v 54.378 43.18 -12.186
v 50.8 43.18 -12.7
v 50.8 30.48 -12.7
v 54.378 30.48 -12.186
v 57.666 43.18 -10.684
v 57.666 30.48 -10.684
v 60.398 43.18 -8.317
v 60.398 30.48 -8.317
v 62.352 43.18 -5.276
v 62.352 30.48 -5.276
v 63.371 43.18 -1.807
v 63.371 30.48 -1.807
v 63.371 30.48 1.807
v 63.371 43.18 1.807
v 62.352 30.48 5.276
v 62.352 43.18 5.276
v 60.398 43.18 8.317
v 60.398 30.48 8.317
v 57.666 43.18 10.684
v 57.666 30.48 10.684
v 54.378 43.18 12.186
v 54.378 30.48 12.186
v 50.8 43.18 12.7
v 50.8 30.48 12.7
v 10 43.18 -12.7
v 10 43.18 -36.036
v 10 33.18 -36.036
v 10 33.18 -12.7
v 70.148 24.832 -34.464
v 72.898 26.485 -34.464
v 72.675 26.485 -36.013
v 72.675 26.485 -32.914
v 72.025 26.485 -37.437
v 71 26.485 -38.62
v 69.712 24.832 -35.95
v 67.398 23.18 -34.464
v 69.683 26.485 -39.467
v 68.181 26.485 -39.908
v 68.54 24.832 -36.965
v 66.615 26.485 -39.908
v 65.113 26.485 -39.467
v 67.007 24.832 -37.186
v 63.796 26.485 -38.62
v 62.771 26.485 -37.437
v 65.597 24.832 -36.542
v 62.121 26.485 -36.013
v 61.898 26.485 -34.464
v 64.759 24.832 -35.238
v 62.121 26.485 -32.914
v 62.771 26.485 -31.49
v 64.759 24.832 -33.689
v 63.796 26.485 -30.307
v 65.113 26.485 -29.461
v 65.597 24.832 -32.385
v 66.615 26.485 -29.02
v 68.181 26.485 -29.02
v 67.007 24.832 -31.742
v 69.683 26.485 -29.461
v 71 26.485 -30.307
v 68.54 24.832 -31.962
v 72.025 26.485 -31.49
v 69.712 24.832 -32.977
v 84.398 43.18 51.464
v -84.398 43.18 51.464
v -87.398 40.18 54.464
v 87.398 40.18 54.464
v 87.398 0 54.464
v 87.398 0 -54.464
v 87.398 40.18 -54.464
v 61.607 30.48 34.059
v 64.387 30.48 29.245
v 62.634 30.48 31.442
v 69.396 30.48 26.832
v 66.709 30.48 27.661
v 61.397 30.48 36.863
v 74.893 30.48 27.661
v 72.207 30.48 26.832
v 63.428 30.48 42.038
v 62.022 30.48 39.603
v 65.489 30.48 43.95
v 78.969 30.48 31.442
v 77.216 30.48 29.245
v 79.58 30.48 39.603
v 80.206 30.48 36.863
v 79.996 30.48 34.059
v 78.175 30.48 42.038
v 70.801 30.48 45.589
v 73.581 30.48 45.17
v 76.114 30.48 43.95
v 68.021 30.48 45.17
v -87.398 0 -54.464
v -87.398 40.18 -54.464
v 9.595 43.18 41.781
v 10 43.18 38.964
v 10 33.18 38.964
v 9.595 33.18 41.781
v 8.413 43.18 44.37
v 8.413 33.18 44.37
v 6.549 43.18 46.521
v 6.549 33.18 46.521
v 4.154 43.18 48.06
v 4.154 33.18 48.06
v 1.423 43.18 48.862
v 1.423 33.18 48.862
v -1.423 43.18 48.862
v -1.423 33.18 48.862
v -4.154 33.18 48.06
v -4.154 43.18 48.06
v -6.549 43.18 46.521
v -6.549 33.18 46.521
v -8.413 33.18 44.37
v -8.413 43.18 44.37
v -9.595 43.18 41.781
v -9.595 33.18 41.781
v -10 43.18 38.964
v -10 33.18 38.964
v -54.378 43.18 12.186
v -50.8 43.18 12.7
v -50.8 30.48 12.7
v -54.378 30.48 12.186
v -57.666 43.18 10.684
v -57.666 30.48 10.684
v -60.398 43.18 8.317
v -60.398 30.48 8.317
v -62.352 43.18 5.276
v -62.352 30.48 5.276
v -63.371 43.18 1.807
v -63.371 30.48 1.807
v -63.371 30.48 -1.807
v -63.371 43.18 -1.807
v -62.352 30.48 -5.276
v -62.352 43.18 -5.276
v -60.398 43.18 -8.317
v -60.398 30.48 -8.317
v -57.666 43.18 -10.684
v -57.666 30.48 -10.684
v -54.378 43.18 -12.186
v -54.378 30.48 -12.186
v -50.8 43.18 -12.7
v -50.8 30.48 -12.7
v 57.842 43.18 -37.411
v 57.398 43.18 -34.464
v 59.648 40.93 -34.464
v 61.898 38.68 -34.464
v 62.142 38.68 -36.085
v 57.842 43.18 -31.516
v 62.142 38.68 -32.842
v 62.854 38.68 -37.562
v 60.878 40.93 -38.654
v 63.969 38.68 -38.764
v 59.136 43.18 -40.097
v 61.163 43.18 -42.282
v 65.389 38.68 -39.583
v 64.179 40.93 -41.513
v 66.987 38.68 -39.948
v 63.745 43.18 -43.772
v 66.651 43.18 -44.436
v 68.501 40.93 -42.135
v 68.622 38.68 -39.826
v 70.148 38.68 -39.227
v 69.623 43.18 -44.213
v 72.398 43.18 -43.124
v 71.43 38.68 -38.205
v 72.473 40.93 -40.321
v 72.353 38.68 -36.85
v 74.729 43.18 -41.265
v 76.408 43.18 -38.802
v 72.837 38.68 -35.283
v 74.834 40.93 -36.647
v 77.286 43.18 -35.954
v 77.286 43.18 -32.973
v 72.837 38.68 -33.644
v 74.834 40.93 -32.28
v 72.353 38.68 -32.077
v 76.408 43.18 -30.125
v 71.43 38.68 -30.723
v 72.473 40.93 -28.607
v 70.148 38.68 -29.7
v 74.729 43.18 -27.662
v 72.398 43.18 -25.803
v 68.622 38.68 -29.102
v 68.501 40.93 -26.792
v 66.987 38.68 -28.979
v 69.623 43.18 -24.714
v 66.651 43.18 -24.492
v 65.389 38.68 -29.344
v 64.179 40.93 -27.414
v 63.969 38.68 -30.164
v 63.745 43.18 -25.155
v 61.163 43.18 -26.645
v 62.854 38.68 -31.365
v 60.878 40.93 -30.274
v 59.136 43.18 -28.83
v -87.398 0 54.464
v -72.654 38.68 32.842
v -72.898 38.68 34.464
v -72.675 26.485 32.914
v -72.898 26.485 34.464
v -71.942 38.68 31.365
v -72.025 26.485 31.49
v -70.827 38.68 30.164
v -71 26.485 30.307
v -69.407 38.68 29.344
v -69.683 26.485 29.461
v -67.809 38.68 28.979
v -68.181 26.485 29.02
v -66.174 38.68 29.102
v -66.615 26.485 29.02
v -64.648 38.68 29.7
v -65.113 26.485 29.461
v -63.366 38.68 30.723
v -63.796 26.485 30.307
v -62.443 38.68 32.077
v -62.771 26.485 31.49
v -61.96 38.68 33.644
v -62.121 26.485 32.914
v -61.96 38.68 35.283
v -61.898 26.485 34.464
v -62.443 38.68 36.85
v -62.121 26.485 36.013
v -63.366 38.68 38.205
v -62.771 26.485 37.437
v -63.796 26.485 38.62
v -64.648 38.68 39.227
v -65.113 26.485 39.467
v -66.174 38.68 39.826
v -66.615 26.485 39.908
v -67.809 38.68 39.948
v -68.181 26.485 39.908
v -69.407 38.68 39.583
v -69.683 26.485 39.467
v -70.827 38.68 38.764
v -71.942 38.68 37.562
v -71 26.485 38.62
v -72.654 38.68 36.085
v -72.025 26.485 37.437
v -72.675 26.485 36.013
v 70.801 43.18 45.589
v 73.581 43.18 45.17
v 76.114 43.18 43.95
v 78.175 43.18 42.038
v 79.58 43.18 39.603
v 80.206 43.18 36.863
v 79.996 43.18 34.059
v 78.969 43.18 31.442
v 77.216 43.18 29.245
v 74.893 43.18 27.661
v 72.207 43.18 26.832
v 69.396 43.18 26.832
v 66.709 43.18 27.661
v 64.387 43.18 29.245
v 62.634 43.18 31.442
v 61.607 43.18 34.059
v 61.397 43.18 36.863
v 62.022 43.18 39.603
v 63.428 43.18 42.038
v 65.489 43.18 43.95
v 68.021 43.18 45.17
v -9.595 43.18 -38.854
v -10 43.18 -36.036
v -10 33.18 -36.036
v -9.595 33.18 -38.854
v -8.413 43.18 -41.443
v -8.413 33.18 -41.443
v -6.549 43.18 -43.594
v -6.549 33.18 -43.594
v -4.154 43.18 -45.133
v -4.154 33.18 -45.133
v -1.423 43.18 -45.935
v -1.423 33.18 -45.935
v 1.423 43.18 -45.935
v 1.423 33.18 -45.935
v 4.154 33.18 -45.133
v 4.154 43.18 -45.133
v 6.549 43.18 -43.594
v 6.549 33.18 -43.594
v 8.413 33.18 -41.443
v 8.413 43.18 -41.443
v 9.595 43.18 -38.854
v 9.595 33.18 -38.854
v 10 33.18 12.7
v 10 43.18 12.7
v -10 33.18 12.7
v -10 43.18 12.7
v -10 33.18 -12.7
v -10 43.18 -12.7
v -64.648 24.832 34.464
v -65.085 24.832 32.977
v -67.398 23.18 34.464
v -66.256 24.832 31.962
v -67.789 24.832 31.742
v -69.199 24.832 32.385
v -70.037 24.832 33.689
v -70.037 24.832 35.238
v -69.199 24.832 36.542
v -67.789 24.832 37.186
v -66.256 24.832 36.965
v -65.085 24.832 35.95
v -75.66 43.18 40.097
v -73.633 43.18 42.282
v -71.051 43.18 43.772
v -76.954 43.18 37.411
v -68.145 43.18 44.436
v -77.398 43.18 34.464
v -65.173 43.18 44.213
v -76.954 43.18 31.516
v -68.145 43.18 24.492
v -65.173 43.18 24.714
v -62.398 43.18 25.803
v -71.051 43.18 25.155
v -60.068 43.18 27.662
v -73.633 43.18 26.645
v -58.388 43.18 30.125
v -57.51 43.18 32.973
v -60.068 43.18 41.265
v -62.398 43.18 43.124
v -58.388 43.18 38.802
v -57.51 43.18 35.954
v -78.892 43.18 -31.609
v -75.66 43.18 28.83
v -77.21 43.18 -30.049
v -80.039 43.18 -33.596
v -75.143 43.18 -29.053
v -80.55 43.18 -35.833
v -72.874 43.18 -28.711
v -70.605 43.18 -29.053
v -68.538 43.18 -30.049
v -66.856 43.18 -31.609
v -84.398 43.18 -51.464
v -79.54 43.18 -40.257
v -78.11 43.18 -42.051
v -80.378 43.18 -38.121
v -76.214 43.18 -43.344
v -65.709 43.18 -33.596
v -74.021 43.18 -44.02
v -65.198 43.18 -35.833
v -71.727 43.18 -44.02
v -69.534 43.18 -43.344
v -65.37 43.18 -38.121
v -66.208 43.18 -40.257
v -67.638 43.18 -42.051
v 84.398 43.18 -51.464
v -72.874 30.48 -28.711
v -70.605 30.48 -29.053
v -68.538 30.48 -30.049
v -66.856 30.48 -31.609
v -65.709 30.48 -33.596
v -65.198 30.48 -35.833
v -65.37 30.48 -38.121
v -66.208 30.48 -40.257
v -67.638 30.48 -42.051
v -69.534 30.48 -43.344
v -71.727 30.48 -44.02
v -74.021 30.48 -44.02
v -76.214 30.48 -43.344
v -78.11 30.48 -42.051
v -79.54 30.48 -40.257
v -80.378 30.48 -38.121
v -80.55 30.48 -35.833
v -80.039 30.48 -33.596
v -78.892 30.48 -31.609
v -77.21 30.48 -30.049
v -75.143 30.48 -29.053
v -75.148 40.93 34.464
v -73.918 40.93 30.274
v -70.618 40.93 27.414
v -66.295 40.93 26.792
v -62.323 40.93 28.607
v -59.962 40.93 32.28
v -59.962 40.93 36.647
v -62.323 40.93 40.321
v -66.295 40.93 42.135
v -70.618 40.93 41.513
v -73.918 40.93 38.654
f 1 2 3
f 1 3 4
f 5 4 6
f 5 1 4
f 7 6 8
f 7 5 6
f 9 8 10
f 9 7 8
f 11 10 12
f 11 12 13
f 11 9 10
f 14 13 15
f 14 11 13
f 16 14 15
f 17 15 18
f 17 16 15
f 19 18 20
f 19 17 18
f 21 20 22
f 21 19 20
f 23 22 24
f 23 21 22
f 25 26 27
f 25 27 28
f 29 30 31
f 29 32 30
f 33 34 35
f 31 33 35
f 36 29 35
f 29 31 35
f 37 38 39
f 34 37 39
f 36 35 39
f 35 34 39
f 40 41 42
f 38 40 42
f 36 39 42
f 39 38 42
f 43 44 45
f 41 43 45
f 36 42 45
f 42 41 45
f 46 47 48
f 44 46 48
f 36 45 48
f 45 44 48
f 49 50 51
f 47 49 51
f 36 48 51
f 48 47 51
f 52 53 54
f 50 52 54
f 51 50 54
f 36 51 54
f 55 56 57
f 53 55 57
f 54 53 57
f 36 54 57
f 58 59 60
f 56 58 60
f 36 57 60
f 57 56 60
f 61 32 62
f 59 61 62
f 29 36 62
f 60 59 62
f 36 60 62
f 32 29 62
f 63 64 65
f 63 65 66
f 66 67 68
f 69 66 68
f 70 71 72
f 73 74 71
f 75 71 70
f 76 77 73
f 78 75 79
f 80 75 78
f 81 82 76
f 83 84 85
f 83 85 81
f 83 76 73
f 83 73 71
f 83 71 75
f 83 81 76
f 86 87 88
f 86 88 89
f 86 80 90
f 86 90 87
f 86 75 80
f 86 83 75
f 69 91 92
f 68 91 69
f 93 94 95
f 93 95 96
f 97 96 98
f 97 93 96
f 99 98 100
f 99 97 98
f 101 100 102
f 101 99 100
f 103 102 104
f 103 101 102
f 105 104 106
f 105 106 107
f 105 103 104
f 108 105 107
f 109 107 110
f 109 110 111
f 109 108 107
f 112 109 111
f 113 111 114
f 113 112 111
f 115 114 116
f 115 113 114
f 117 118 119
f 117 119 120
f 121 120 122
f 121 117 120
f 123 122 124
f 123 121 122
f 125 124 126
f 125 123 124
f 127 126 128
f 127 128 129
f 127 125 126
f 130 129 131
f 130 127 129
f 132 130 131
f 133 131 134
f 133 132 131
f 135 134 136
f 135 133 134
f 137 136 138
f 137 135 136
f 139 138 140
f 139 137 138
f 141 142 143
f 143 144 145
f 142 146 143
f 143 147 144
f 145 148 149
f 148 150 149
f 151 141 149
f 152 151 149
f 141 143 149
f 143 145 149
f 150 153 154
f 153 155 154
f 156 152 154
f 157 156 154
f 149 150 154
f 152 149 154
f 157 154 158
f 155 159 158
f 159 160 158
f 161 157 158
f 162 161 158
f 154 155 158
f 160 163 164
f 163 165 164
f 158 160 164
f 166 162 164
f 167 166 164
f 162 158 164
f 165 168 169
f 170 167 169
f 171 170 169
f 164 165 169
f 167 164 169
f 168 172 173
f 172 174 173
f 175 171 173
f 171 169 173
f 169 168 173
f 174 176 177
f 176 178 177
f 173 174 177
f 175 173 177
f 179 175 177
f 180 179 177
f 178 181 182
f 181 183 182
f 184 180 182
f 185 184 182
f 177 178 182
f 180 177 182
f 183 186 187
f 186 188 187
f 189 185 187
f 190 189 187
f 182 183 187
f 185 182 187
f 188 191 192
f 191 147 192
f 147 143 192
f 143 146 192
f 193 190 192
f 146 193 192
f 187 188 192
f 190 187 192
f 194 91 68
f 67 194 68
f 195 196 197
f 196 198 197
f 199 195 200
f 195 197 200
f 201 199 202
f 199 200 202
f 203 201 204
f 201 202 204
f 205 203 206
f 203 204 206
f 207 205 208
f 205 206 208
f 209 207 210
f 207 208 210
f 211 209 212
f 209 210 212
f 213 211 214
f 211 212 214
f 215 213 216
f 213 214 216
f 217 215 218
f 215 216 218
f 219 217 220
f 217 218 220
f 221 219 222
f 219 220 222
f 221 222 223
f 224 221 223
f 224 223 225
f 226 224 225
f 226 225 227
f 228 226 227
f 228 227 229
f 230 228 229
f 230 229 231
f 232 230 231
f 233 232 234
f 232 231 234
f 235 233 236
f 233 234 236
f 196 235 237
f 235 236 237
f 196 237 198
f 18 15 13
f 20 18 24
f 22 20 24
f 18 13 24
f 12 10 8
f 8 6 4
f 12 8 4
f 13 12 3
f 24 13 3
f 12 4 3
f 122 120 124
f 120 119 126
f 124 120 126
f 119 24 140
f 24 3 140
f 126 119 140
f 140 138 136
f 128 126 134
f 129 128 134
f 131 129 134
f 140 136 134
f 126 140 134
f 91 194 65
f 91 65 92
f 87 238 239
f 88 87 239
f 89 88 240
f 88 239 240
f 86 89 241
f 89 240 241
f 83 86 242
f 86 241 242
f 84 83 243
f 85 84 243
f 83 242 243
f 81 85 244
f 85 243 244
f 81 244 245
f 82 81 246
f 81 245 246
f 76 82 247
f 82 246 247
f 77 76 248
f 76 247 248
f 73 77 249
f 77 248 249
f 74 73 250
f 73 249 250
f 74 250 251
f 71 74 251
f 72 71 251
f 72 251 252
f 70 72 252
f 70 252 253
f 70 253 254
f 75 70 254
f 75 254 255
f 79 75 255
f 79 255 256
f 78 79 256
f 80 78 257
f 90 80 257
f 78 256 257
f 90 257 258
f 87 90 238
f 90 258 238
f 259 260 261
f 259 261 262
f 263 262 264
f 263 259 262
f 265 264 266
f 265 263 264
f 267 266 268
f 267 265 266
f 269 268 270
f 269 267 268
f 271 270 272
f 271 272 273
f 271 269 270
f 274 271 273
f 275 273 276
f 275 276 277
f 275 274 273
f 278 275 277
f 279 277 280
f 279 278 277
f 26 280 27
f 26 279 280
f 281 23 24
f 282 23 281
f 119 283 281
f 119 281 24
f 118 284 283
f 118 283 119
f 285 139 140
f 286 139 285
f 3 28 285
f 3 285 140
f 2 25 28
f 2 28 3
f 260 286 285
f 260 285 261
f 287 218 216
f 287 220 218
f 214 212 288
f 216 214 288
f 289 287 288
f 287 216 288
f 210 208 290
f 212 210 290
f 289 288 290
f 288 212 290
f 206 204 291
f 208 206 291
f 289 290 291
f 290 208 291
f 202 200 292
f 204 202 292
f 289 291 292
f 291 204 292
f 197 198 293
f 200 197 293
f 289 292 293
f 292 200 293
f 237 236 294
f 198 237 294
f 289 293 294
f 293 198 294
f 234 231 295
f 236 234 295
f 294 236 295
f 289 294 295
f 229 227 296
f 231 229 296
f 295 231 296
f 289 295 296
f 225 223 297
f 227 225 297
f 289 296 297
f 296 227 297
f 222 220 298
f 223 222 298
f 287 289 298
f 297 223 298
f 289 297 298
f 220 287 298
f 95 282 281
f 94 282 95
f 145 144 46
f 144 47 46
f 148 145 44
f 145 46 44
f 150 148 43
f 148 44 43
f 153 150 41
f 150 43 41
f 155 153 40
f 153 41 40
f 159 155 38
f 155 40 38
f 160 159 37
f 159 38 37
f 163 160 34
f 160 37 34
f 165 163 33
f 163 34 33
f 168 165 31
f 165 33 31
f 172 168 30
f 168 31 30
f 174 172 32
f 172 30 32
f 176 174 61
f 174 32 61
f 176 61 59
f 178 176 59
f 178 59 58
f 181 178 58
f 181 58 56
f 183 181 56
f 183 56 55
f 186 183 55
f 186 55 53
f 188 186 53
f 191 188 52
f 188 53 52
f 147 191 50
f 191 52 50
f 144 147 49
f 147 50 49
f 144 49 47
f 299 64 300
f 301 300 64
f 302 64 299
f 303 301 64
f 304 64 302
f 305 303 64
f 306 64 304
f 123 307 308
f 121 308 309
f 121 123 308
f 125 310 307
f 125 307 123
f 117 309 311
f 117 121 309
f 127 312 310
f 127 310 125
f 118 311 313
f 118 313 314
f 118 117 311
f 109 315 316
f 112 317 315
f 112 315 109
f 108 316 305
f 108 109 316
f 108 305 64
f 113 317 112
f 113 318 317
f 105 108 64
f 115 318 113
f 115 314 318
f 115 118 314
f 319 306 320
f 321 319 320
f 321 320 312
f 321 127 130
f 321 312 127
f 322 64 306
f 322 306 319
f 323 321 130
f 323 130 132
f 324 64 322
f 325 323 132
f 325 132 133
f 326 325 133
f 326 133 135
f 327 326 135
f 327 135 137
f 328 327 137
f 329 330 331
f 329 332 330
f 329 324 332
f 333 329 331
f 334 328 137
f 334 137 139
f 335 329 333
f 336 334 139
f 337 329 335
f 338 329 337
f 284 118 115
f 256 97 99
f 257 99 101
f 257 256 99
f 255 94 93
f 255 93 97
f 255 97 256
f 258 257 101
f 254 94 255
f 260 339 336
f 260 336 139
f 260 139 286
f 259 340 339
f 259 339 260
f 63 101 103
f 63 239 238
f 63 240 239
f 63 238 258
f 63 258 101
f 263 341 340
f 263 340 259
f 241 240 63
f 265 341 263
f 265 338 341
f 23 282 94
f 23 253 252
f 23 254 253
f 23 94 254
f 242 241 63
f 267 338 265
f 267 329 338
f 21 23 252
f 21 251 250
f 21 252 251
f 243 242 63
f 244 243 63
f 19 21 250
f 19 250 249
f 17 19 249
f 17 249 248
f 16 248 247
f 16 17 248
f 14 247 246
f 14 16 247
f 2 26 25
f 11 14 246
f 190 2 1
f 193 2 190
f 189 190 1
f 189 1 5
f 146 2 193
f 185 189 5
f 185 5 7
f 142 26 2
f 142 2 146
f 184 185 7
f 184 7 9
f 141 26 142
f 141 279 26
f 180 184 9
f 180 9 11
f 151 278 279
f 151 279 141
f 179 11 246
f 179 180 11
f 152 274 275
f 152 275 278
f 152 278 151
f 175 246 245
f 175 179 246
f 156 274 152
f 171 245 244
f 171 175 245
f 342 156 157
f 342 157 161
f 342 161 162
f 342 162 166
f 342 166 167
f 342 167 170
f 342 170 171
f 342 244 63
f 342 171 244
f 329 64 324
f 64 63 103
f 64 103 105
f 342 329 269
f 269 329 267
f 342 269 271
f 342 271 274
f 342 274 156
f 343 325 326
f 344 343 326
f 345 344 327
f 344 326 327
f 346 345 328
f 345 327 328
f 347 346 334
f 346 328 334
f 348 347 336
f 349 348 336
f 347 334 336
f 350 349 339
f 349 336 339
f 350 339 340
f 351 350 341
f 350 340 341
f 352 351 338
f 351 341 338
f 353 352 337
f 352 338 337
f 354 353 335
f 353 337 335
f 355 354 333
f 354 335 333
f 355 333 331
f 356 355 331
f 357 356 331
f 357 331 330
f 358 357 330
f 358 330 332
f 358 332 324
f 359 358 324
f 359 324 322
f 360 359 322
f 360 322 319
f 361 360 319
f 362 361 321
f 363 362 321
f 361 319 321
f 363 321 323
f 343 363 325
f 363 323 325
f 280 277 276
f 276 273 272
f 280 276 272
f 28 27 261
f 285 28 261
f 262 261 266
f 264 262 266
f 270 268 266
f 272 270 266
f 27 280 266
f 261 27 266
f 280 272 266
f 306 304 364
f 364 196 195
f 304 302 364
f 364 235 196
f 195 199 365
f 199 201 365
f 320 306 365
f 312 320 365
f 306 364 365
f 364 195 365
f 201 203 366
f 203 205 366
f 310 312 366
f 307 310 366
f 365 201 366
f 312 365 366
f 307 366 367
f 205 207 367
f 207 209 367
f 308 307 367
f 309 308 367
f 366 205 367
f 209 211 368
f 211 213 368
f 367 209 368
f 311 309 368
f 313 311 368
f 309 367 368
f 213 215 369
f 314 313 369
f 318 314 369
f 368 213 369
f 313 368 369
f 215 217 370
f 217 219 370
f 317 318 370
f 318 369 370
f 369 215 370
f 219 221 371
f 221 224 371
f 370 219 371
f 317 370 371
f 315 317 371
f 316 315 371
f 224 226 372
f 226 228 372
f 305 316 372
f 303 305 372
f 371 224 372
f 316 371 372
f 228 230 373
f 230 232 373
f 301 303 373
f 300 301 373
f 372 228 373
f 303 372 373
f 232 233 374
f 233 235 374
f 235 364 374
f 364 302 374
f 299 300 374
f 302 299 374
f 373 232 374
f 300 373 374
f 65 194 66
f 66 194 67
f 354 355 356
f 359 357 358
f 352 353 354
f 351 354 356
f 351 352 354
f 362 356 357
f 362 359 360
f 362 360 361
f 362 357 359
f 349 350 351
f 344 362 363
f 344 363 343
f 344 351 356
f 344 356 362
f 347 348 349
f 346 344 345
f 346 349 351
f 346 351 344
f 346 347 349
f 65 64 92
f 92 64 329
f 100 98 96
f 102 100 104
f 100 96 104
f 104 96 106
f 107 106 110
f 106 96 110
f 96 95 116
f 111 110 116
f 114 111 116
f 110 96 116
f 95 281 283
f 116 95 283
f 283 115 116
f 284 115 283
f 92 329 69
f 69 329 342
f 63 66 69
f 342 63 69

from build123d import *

# Parameters (mm, degrees)
SKETCH1_W                                        = 174.796166906
SKETCH1_H                                        = 108.92723011
BOSS_EXTRUDE1_DEPTH                              = 43.18
SKETCH2_R                                        = 7.697413188
SKETCH2_R_2                                      = 9.430807524
CUT_EXTRUDE1_DEPTH                               = 12.7
CUT_EXTRUDE2_DEPTH                               = 10
CSK_FOR_M10_FLAT_HEAD_MACHINE_SCREW1_D           = 11
CSK_FOR_M10_FLAT_HEAD_MACHINE_SCREW1_DEPTH       = 16.695266595
CSK_FOR_M10_FLAT_HEAD_MACHINE_SCREW1_CSINK_D     = 20
CSK_FOR_M10_FLAT_HEAD_MACHINE_SCREW1_CSINK_ANGLE = 90
CSK_FOR_M10_FLAT_HEAD_MACHINE_SCREW1_TIP         = 3.304733405
CHAMFER1_SIZE                                    = 3


with BuildPart() as part:
    # Sketch1 → Boss-Extrude1 (new body)
    with BuildSketch(Plane(origin=(0, 0, 0), x_dir=(1, 0, 0), z_dir=(0, 1, 0))):
        Rectangle(SKETCH1_W, SKETCH1_H)
    extrude(amount=BOSS_EXTRUDE1_DEPTH)

    # Sketch2 → Cut-Extrude1 (cut)
    with BuildSketch(Plane(origin=(0, 43.18, 0), x_dir=(1, 0, 0), z_dir=(0, 1, 0))):
        with Locations(Location((-72.874036632, 36.40863105, 0), (0, 0, 270))):  # turned: the seam where the file's is
            Circle(SKETCH2_R)
        with Locations(Location((70.801263176, -36.157833353, 0), (0, 0, 270))):  # turned: the seam where the file's is
            Circle(SKETCH2_R_2)
        with BuildLine():
            Line((-50.8, 12.7), (50.8, 12.7))
            ThreePointArc((50.8, 12.7), (63.5, 0), (50.8, -12.7))
            Line((50.8, -12.7), (-50.8, -12.7))
            ThreePointArc((-50.8, -12.7), (-63.5, 0), (-50.8, 12.7))
        make_face()
    extrude(amount=-CUT_EXTRUDE1_DEPTH, mode=Mode.SUBTRACT)

    # Sketch3 → Cut-Extrude2 (cut)
    with BuildSketch(Plane(origin=(0, 43.18, 0), x_dir=(1, 0, 0), z_dir=(0, 1, 0))):
        with BuildLine():
            Line((10, 36.036384945), (10, -38.963615055))
            ThreePointArc((10, -38.963615055), (0, -48.963615055), (-10, -38.963615055))
            Line((-10, -38.963615055), (-10, 36.036384945))
            ThreePointArc((-10, 36.036384945), (0, 46.036384945), (10, 36.036384945))
        make_face()
    extrude(amount=-CUT_EXTRUDE2_DEPTH, mode=Mode.SUBTRACT)

    # CSK for M10 Flat Head Machine Screw1
    with Locations(Plane(origin=(0, 43.18, 0), x_dir=(1, 0, 0), z_dir=(0, 1, 0))):
        with Locations((67.398083453, 34.463615055), (-67.398083453, -34.463615055)):
            CounterSinkHole(CSK_FOR_M10_FLAT_HEAD_MACHINE_SCREW1_D / 2, CSK_FOR_M10_FLAT_HEAD_MACHINE_SCREW1_CSINK_D / 2, depth=CSK_FOR_M10_FLAT_HEAD_MACHINE_SCREW1_DEPTH, counter_sink_angle=CSK_FOR_M10_FLAT_HEAD_MACHINE_SCREW1_CSINK_ANGLE)
            with Locations((0, 0, -(CSK_FOR_M10_FLAT_HEAD_MACHINE_SCREW1_DEPTH + CSK_FOR_M10_FLAT_HEAD_MACHINE_SCREW1_TIP / 2))):  # 118° drill point
                Cone(0, CSK_FOR_M10_FLAT_HEAD_MACHINE_SCREW1_D / 2, CSK_FOR_M10_FLAT_HEAD_MACHINE_SCREW1_TIP, mode=Mode.SUBTRACT)

    # Chamfer1
    chamfer1_edges = [part.edges().sort_by_distance(p)[0] for p in [
        (-87.398083453, 43.18, 0),
        (0, 43.18, 54.463615055),
        (87.398083453, 43.18, 0),
        (0, 43.18, -54.463615055),
    ]]
    chamfer(chamfer1_edges, length=CHAMFER1_SIZE)


solid = part.part
